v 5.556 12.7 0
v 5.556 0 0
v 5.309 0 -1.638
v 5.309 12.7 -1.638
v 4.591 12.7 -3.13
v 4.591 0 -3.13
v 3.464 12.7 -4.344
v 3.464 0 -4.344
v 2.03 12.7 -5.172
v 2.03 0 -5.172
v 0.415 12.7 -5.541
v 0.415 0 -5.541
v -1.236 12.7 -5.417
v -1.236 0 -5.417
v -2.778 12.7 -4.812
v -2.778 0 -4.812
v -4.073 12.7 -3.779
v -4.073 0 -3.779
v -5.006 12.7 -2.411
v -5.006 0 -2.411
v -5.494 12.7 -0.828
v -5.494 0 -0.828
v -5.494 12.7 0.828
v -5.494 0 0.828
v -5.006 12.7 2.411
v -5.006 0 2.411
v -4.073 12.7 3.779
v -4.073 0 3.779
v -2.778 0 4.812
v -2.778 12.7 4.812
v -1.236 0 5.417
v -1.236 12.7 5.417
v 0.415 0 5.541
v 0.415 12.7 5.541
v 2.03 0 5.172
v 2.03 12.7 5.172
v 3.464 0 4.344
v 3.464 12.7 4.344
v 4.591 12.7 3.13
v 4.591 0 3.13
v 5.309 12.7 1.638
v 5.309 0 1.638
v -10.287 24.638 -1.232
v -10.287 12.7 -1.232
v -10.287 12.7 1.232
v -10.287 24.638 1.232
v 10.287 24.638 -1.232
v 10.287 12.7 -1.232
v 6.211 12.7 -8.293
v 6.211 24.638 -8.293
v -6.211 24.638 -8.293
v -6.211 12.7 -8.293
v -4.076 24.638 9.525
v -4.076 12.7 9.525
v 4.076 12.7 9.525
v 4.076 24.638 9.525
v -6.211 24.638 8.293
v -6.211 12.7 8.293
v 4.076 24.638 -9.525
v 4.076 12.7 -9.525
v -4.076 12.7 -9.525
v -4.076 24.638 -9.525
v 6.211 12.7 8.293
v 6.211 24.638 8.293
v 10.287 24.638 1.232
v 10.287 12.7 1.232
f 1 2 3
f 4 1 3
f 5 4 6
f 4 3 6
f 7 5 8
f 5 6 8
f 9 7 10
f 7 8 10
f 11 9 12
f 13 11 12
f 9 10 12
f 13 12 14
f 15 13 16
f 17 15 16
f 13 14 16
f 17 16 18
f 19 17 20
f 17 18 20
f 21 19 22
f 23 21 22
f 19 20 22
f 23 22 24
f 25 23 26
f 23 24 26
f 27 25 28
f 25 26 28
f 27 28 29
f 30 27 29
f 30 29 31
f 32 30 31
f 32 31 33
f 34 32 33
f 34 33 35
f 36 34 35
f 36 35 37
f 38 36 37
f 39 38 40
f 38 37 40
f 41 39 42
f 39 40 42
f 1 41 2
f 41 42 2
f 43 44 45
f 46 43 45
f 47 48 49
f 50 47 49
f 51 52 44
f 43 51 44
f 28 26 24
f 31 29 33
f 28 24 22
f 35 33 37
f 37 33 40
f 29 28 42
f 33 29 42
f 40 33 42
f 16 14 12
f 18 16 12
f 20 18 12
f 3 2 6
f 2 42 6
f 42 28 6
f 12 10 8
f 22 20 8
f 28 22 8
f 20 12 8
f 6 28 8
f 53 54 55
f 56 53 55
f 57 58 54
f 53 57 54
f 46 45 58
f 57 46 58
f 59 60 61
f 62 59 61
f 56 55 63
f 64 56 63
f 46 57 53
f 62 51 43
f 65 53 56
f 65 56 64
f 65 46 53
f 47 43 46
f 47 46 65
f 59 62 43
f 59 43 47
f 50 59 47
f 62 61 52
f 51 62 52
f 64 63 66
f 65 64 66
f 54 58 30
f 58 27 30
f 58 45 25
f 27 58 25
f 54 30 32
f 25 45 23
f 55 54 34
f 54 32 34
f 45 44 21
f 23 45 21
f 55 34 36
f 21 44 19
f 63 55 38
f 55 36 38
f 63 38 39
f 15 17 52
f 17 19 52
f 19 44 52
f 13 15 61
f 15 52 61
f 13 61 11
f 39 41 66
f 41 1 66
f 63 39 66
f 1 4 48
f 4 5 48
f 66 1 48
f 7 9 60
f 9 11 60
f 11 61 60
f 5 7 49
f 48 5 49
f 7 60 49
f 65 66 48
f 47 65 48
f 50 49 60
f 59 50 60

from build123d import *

# Parameters (mm, degrees)
SKETCH1_R           = 5.55625
BOSS_EXTRUDE1_DEPTH = 12.7
BOSS_EXTRUDE2_DEPTH = 11.938


with BuildPart() as part:
    # Sketch1 → Boss-Extrude1 (new body)
    with BuildSketch(Plane(origin=(0, 0, 0), x_dir=(1, 0, 0), z_dir=(0, 1, 0))):
        Circle(SKETCH1_R)
    extrude(amount=BOSS_EXTRUDE1_DEPTH)

    # Sketch3 → Boss-Extrude2 (add)
    with BuildSketch(Plane(origin=(0, 12.7, 0), x_dir=(1, 0, 0), z_dir=(0, 1, 0))):
        Polygon((-10.287, 1.232393343), (-10.287, -1.232393343), (-6.210783894, -8.292606741), (-4.076216154, -9.525), (4.076216154, -9.525), (6.210783894, -8.292606741), (10.287, -1.232393343), (10.287, 1.232393343), (6.210783894, 8.292606741), (4.076216154, 9.525), (-4.076216154, 9.525), (-6.210783894, 8.292606741), align=None)
    extrude(amount=BOSS_EXTRUDE2_DEPTH)


solid = part.part
